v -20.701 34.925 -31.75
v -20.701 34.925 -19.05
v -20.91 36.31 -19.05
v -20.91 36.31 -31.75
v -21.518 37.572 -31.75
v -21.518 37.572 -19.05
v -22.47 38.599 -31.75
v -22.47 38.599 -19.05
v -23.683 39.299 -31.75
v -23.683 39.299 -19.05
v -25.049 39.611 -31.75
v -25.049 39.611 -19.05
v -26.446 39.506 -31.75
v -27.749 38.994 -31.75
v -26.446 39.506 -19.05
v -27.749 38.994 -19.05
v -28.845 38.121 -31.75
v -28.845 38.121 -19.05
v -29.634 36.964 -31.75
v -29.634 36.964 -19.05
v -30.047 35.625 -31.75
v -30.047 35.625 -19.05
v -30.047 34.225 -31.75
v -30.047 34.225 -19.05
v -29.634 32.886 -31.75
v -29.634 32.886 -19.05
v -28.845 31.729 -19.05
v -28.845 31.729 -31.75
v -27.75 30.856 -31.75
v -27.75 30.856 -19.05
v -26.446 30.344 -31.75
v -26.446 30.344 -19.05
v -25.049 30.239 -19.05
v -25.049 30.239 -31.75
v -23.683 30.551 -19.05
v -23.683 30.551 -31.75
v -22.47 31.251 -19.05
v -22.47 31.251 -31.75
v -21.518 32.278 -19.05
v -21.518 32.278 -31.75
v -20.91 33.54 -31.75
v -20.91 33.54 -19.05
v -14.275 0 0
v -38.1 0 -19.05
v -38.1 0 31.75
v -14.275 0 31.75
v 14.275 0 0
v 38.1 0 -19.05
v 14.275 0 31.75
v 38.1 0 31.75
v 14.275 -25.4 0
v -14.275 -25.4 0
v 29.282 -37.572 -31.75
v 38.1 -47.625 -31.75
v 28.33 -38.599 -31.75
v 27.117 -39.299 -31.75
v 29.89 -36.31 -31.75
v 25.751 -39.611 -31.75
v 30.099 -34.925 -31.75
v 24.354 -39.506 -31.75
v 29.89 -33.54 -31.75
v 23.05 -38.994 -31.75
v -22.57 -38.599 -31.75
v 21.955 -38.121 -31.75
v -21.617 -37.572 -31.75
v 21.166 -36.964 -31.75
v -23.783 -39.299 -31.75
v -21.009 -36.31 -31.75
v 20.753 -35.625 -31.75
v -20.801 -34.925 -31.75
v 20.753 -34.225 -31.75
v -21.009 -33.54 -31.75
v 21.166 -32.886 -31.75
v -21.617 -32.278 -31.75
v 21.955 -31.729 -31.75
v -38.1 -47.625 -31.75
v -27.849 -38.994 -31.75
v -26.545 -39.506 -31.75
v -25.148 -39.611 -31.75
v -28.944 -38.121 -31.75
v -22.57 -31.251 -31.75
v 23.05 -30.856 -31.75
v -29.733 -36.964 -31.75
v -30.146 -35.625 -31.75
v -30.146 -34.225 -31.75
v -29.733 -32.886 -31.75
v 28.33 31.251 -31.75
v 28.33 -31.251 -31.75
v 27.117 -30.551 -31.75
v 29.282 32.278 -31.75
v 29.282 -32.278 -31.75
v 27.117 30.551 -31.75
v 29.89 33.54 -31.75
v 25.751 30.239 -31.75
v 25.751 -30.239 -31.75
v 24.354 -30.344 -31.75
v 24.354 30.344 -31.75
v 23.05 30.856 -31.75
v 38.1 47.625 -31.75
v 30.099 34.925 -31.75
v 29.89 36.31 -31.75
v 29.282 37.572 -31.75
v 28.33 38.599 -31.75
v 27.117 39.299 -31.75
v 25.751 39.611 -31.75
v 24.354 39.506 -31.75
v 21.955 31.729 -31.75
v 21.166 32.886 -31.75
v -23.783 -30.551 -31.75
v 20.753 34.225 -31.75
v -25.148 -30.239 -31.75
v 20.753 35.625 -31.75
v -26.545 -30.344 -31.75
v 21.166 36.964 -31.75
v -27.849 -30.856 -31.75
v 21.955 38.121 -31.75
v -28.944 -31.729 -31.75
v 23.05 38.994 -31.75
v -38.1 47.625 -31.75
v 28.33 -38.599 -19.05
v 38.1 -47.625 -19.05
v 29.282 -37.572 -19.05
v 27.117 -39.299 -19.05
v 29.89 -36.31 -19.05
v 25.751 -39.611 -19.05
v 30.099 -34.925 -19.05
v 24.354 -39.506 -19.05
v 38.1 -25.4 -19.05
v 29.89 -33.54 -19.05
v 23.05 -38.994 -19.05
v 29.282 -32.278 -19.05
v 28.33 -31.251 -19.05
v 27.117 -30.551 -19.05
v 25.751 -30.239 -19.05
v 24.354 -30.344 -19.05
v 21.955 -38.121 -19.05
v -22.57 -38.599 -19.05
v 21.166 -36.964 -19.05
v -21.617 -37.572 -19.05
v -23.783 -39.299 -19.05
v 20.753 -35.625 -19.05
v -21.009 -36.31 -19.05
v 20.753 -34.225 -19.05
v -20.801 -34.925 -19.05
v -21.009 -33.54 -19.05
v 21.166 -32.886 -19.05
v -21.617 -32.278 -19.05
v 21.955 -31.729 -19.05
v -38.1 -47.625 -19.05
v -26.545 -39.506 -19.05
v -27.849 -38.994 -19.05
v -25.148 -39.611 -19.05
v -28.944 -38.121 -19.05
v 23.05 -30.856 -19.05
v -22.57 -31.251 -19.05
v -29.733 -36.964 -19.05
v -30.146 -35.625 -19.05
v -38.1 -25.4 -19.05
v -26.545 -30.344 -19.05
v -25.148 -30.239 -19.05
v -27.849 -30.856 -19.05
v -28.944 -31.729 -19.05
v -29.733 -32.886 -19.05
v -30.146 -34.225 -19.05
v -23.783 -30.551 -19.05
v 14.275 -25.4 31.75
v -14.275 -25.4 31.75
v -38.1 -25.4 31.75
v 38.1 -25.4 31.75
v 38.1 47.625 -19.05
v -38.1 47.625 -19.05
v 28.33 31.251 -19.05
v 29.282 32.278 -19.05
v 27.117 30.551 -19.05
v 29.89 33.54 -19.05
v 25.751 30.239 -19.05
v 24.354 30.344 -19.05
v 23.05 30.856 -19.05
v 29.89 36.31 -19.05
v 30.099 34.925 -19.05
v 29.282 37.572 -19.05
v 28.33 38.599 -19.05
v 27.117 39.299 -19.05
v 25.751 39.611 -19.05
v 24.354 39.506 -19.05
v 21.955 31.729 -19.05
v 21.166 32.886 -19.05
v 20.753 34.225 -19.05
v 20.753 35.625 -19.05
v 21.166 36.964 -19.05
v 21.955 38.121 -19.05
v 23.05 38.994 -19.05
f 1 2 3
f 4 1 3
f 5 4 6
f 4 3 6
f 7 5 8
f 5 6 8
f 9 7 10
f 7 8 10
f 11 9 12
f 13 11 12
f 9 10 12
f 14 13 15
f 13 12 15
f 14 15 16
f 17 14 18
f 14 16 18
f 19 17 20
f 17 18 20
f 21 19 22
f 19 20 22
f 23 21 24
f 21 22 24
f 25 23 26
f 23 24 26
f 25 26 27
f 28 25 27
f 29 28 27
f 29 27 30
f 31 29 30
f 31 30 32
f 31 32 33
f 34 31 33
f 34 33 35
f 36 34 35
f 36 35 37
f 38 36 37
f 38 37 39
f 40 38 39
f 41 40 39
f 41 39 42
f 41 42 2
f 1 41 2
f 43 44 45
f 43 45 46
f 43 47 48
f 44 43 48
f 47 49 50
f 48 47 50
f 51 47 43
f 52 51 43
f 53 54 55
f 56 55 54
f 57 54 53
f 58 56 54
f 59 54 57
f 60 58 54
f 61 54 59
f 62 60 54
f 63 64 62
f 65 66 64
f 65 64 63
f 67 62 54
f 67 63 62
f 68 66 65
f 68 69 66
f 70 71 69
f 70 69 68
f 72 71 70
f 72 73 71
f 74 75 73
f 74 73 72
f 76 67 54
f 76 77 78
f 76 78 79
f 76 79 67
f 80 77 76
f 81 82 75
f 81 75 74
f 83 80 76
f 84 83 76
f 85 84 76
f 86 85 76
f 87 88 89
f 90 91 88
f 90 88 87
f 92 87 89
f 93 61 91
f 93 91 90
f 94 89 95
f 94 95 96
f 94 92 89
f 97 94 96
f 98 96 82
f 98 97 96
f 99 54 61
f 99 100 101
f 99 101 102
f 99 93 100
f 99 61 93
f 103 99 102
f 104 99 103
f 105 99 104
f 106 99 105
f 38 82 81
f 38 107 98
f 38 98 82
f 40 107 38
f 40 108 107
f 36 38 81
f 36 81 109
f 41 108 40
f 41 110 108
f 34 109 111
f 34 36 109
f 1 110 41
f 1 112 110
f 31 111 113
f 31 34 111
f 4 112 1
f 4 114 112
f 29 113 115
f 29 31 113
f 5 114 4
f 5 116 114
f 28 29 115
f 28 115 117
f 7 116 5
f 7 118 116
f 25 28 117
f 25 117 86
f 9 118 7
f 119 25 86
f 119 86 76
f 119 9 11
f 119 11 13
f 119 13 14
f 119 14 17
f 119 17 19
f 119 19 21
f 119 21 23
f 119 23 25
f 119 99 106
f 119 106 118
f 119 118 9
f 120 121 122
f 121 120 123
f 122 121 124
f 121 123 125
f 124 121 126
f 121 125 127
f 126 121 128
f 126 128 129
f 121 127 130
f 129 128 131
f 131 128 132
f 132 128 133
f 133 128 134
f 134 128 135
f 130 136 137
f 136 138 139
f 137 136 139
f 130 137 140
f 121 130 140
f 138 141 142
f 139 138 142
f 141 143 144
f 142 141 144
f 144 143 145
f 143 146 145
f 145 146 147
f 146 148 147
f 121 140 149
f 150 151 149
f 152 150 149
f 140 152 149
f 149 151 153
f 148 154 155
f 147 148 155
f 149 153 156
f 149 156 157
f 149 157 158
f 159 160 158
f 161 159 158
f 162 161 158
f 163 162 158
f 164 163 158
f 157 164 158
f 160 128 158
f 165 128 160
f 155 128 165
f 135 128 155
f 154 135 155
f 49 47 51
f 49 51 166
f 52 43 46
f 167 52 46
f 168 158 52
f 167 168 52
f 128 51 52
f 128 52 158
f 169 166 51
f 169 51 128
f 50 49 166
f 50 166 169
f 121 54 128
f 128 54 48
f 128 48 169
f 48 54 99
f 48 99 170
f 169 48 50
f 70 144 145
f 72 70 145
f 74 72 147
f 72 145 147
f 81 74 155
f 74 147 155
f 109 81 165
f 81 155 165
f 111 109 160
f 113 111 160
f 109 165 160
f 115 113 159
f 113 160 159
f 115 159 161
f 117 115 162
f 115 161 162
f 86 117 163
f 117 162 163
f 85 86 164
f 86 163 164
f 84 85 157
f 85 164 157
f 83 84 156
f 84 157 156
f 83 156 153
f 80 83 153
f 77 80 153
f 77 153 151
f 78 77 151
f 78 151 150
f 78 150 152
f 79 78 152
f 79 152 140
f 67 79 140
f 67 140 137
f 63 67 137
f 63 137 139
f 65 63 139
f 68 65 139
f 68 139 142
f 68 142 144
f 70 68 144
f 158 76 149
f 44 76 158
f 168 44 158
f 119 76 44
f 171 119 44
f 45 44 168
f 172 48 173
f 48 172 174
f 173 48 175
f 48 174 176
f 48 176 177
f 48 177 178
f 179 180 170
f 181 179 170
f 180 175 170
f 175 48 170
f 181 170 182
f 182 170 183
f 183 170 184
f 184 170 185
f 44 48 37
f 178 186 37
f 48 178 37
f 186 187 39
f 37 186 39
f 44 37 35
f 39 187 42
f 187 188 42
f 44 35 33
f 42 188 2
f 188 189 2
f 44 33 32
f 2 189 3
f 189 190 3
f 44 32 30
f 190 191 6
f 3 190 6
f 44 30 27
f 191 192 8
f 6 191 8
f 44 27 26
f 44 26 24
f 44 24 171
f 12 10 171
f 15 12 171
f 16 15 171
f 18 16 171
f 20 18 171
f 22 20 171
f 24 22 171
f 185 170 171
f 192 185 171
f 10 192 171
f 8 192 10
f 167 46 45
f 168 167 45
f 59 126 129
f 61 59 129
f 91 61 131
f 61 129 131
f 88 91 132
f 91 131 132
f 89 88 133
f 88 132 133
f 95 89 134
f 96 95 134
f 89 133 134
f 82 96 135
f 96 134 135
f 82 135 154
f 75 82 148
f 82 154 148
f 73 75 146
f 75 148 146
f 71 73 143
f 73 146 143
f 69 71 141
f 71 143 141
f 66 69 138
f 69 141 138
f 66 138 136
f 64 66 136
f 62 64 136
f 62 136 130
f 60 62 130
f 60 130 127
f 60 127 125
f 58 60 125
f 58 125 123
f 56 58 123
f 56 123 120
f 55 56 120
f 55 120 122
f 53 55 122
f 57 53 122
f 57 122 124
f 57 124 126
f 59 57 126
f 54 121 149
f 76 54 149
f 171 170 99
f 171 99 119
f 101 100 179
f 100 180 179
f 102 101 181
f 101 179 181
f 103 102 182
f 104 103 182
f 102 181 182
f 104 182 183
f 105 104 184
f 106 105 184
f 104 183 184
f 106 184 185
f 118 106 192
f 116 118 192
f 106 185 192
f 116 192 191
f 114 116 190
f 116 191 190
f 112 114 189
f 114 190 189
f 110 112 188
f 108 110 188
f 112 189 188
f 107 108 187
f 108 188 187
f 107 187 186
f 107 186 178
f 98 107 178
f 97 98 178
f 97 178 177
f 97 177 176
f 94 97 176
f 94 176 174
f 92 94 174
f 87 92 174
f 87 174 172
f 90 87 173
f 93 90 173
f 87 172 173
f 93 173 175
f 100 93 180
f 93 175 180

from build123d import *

# Parameters (mm, degrees)
F0_W     = 23.8252
F0_H     = 31.75
F1_DEPTH = 25.4
F2_W     = 76.2
F2_H     = 12.7
F3_DEPTH = 47.625
F4_R     = 4.699
F5_DEPTH = 12.701
F6_R     = 4.699
F7_DEPTH = 33.02


with BuildPart() as f1:
    # F0 (on Front) → F1 (new body)
    with BuildSketch(Plane.XZ):
        with Locations((26.1874, 15.875)):
            Rectangle(F0_W, F0_H)
        Polygon((38.1, -31.75), (38.1, 0), (14.2748, 0), (-14.2748, 0), (-14.2748, 31.75), (-38.1, 31.75), (-38.1, -31.75), align=None)
    extrude(amount=F1_DEPTH)

    # F2 (on face) → F3 (join, symmetric)
    with BuildSketch(Plane(origin=(0, 0, 0), x_dir=(-1, 0, 0), z_dir=(0, 1, 0))):
        with Locations((0, -25.4)):
            Rectangle(F2_W, F2_H)
    extrude(amount=F3_DEPTH, both=True)

    # F4 (on face) → F5 (cut, through all)
    with BuildSketch(Plane.XY.offset(-19.05)):
        with Locations((-25.4996093811, -34.925)):
            Circle(F4_R)
        with Locations((25.4, -34.925)):
            Circle(F4_R)
    extrude(amount=-F5_DEPTH, mode=Mode.SUBTRACT)

    # F6 (on face) → F7 (cut, symmetric)
    with BuildSketch(Plane.XY.offset(-19.05)):
        with Locations((-25.4, 34.925)):
            Circle(F6_R)
        with Locations((25.4, 34.925)):
            Circle(F6_R)
    extrude(amount=F7_DEPTH, both=True, mode=Mode.SUBTRACT)


solid = f1.part
